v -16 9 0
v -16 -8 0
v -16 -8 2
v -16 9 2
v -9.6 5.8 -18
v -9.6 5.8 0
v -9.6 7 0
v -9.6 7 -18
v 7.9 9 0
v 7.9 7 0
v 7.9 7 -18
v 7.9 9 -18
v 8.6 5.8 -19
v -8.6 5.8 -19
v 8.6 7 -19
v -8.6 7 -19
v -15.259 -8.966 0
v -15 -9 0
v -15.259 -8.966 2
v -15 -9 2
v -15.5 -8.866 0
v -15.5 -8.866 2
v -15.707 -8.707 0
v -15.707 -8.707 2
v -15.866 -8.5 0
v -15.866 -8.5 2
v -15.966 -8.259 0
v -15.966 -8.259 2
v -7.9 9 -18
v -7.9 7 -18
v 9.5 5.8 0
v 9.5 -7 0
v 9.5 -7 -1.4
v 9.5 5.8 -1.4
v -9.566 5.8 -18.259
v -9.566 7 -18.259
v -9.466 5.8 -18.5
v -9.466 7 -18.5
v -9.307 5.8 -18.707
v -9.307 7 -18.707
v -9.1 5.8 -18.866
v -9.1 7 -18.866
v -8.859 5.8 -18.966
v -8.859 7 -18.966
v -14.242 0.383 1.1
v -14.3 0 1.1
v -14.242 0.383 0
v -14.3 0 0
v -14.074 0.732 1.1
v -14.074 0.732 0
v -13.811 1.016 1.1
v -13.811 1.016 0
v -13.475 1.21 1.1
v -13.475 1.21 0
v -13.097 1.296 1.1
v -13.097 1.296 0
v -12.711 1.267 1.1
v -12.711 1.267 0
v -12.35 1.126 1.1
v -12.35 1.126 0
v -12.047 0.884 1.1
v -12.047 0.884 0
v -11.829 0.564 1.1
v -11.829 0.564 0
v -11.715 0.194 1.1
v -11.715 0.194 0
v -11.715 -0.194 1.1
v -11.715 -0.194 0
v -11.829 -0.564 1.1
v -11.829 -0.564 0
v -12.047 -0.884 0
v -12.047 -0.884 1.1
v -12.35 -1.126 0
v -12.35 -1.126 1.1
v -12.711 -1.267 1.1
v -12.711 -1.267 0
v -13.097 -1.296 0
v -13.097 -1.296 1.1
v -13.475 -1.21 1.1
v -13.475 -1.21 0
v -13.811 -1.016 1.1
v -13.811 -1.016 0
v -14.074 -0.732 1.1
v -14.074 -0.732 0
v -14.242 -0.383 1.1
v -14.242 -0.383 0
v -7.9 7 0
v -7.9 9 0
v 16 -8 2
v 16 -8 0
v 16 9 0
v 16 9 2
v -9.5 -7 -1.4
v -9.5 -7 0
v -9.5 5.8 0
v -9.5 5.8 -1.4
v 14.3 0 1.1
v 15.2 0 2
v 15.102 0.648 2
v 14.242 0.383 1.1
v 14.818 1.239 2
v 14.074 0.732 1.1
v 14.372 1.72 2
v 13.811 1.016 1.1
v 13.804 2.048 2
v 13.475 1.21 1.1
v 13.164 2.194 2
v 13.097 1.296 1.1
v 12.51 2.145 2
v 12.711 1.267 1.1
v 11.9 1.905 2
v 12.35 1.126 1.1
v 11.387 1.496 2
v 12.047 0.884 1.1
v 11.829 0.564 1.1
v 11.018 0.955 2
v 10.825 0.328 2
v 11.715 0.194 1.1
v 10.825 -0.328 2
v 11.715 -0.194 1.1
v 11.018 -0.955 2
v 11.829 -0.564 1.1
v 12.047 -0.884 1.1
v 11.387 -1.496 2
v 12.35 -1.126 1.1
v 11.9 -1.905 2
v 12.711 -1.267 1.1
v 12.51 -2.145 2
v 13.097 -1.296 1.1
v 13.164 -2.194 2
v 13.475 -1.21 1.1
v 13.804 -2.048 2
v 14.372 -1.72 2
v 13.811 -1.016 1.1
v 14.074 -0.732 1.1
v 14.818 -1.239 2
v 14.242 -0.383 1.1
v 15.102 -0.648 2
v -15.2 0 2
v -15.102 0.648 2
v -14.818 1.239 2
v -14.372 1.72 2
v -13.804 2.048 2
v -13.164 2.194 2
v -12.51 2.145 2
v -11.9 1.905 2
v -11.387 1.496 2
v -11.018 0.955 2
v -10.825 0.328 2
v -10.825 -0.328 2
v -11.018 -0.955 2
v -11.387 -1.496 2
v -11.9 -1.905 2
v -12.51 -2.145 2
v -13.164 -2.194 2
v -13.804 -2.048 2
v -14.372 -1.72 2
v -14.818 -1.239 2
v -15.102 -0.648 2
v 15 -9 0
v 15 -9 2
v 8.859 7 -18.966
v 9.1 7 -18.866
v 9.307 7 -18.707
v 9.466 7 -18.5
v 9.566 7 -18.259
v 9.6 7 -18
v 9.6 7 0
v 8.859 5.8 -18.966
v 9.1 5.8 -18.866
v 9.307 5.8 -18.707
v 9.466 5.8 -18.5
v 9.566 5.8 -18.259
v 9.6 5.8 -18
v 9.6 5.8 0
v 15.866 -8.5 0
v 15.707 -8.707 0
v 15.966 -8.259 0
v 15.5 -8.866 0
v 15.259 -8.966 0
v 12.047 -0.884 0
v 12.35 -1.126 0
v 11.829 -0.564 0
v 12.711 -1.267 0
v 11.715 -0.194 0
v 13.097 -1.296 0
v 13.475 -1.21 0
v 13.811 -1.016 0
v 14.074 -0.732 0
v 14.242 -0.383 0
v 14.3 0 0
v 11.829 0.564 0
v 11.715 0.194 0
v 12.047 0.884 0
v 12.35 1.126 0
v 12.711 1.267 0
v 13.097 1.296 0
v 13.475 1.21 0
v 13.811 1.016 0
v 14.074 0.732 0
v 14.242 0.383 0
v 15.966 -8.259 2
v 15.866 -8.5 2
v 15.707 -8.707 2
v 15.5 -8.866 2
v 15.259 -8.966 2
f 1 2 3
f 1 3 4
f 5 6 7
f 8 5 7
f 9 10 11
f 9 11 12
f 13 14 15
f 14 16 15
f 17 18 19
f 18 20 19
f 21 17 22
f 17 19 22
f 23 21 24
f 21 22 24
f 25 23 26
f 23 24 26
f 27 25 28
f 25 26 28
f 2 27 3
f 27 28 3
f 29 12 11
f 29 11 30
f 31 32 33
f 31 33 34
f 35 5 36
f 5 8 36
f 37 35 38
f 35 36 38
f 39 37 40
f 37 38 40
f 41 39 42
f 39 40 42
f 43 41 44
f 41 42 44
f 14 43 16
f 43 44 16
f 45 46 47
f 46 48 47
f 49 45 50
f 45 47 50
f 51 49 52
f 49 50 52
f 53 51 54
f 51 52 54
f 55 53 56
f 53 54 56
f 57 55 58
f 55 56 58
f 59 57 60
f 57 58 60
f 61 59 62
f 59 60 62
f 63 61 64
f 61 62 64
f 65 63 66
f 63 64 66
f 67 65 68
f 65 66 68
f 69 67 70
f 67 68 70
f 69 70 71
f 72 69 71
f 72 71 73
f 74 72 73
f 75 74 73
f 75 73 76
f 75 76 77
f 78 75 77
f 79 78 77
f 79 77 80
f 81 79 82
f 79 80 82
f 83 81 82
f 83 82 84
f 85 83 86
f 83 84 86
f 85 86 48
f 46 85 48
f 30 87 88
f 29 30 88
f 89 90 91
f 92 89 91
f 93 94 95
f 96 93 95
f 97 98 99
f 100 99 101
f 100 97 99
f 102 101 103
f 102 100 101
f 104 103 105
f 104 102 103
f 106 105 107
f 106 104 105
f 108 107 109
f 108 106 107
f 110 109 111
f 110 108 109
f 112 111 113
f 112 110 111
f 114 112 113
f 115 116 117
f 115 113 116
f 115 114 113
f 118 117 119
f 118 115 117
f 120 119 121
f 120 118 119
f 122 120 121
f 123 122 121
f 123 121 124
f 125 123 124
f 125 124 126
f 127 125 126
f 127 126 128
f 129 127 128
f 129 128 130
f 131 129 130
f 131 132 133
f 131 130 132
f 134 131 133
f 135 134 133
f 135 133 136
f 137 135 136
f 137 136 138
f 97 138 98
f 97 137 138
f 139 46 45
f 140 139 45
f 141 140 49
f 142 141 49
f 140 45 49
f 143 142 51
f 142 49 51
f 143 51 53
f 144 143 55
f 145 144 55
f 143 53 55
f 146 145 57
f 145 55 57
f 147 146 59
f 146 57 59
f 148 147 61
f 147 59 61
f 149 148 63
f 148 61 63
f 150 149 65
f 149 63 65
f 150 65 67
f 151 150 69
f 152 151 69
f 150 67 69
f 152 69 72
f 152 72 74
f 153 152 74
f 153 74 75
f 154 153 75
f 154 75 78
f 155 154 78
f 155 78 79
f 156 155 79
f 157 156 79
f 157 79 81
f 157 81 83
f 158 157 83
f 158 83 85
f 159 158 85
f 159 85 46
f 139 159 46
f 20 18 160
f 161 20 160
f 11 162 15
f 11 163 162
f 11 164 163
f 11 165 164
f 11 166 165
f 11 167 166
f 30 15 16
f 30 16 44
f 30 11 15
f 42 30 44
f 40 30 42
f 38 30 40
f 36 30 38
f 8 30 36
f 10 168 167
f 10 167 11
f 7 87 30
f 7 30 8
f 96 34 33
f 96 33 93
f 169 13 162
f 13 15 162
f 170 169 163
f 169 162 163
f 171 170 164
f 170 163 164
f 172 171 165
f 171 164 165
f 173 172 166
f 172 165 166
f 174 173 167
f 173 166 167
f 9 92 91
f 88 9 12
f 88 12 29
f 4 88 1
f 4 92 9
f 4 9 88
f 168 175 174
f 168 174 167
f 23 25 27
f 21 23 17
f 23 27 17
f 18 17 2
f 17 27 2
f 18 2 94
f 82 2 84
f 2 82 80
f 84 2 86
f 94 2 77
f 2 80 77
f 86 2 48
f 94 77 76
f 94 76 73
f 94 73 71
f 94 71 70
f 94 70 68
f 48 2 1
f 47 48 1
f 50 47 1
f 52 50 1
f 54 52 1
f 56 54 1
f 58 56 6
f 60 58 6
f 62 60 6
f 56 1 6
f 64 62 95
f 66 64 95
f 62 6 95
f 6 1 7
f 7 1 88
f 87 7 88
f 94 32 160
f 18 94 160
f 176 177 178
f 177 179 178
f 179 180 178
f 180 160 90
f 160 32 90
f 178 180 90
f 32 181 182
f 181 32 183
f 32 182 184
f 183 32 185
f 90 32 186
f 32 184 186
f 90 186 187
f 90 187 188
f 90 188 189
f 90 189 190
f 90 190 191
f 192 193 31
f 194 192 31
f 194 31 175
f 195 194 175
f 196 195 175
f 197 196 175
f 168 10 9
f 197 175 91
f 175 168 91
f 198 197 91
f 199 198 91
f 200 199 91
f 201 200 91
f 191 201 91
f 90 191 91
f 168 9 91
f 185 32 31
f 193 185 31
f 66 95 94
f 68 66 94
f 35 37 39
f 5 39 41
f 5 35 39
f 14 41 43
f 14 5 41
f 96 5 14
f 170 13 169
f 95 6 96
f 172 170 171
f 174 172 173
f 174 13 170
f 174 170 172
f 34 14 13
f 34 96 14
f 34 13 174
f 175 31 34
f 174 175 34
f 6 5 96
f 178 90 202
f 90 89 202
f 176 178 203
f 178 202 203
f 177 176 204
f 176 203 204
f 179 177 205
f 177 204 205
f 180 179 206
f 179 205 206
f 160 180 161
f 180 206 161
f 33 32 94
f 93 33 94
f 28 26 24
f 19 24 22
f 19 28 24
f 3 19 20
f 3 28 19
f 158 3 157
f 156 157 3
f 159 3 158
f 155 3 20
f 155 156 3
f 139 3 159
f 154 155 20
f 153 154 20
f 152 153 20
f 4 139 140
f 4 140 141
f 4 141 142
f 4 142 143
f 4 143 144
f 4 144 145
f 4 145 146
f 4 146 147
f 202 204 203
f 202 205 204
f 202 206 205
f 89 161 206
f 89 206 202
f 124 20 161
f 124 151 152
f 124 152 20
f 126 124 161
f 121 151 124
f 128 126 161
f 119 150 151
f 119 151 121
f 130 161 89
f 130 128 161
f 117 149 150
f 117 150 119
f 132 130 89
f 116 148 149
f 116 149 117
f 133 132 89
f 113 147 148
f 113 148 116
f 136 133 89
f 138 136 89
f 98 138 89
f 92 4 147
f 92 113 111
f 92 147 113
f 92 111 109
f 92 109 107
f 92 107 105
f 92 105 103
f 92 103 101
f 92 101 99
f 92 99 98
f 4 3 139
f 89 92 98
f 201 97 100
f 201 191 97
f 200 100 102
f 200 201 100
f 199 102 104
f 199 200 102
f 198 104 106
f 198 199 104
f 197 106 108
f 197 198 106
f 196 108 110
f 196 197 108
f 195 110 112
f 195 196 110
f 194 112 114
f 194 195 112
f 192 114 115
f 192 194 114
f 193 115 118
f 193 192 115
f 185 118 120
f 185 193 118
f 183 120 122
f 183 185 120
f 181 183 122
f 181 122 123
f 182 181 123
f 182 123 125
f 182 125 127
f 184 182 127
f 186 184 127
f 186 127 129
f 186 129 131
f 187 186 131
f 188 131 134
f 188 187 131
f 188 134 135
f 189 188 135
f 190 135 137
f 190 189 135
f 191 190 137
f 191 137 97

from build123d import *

# Parameters (mm, degrees)
ESQUISSE1_W                                    = 32
ESQUISSE1_H                                    = 18
BOSS_EXTRU_1_DEPTH                             = 2
ESQUISSE2_W                                    = 19
ESQUISSE2_H                                    = 14
BOSS_EXTRU_2_DEPTH                             = 1.4
FRAISAGE_POUR_VIS_T_TE_FRAIS_E_M21_D           = 2.6
FRAISAGE_POUR_VIS_T_TE_FRAIS_E_M21_CSINK_D     = 4.4
FRAISAGE_POUR_VIS_T_TE_FRAIS_E_M21_CSINK_ANGLE = 90
ESQUISSE6_W                                    = 15.8
ESQUISSE6_H                                    = 2
BOSS_EXTRU_3_DEPTH                             = 18
ESQUISSE7_W                                    = 19.2
ESQUISSE7_H                                    = 1.2
BOSS_EXTRU_4_DEPTH                             = 21
CONG_5_R                                       = 1


with BuildPart() as part:
    # Esquisse1 → Boss.-Extru.1 (new body)
    with BuildSketch(Plane.XY):
        Rectangle(ESQUISSE1_W, ESQUISSE1_H)
    extrude(amount=BOSS_EXTRU_1_DEPTH)

    # Esquisse2 → Boss.-Extru.2 (add)
    with BuildSketch(Plane(origin=(0, 0, 0), x_dir=(-1, 0, 0), z_dir=(0, 0, -1))):
        Rectangle(ESQUISSE2_W, ESQUISSE2_H)
    extrude(amount=BOSS_EXTRU_2_DEPTH)

    # Fraisage pour vis à tête fraisée M21 (through all)
    with Locations(Plane.XY.offset(2)):
        with Locations((-13, 0)):
            fraisage_pour_vis_t_te_frais_e_m21 = CounterSinkHole(FRAISAGE_POUR_VIS_T_TE_FRAIS_E_M21_D / 2, FRAISAGE_POUR_VIS_T_TE_FRAIS_E_M21_CSINK_D / 2, counter_sink_angle=FRAISAGE_POUR_VIS_T_TE_FRAIS_E_M21_CSINK_ANGLE)

    # Symétrie1: Fraisage pour vis à tête fraisée M21 across plane
    add(fraisage_pour_vis_t_te_frais_e_m21.mirror(Plane(origin=(0, 0, 0), x_dir=(0, 0, 1), z_dir=(1, 0, 0))), mode=Mode.SUBTRACT)

    # Esquisse6 → Boss.-Extru.3 (add)
    with BuildSketch(Plane(origin=(0, 0, 0), x_dir=(-1, 0, 0), z_dir=(0, 0, -1))):
        with Locations((0, 8)):
            Rectangle(ESQUISSE6_W, ESQUISSE6_H)
    extrude(amount=BOSS_EXTRU_3_DEPTH)

    # Esquisse7 → Boss.-Extru.4 (add)
    with BuildSketch(Plane.XY.offset(2)):
        with Locations((0, 6.4)):
            Rectangle(ESQUISSE7_W, ESQUISSE7_H)
    extrude(amount=-BOSS_EXTRU_4_DEPTH)

    # Congé5
    cong_5_edges = [part.edges().sort_by_distance(p)[0] for p in [
        (9.6, 6.4, -19),
        (-9.6, 6.4, -19),
        (16, -9, 1),
        (-16, -9, 1),
    ]]
    fillet(cong_5_edges, radius=CONG_5_R)


solid = part.part
